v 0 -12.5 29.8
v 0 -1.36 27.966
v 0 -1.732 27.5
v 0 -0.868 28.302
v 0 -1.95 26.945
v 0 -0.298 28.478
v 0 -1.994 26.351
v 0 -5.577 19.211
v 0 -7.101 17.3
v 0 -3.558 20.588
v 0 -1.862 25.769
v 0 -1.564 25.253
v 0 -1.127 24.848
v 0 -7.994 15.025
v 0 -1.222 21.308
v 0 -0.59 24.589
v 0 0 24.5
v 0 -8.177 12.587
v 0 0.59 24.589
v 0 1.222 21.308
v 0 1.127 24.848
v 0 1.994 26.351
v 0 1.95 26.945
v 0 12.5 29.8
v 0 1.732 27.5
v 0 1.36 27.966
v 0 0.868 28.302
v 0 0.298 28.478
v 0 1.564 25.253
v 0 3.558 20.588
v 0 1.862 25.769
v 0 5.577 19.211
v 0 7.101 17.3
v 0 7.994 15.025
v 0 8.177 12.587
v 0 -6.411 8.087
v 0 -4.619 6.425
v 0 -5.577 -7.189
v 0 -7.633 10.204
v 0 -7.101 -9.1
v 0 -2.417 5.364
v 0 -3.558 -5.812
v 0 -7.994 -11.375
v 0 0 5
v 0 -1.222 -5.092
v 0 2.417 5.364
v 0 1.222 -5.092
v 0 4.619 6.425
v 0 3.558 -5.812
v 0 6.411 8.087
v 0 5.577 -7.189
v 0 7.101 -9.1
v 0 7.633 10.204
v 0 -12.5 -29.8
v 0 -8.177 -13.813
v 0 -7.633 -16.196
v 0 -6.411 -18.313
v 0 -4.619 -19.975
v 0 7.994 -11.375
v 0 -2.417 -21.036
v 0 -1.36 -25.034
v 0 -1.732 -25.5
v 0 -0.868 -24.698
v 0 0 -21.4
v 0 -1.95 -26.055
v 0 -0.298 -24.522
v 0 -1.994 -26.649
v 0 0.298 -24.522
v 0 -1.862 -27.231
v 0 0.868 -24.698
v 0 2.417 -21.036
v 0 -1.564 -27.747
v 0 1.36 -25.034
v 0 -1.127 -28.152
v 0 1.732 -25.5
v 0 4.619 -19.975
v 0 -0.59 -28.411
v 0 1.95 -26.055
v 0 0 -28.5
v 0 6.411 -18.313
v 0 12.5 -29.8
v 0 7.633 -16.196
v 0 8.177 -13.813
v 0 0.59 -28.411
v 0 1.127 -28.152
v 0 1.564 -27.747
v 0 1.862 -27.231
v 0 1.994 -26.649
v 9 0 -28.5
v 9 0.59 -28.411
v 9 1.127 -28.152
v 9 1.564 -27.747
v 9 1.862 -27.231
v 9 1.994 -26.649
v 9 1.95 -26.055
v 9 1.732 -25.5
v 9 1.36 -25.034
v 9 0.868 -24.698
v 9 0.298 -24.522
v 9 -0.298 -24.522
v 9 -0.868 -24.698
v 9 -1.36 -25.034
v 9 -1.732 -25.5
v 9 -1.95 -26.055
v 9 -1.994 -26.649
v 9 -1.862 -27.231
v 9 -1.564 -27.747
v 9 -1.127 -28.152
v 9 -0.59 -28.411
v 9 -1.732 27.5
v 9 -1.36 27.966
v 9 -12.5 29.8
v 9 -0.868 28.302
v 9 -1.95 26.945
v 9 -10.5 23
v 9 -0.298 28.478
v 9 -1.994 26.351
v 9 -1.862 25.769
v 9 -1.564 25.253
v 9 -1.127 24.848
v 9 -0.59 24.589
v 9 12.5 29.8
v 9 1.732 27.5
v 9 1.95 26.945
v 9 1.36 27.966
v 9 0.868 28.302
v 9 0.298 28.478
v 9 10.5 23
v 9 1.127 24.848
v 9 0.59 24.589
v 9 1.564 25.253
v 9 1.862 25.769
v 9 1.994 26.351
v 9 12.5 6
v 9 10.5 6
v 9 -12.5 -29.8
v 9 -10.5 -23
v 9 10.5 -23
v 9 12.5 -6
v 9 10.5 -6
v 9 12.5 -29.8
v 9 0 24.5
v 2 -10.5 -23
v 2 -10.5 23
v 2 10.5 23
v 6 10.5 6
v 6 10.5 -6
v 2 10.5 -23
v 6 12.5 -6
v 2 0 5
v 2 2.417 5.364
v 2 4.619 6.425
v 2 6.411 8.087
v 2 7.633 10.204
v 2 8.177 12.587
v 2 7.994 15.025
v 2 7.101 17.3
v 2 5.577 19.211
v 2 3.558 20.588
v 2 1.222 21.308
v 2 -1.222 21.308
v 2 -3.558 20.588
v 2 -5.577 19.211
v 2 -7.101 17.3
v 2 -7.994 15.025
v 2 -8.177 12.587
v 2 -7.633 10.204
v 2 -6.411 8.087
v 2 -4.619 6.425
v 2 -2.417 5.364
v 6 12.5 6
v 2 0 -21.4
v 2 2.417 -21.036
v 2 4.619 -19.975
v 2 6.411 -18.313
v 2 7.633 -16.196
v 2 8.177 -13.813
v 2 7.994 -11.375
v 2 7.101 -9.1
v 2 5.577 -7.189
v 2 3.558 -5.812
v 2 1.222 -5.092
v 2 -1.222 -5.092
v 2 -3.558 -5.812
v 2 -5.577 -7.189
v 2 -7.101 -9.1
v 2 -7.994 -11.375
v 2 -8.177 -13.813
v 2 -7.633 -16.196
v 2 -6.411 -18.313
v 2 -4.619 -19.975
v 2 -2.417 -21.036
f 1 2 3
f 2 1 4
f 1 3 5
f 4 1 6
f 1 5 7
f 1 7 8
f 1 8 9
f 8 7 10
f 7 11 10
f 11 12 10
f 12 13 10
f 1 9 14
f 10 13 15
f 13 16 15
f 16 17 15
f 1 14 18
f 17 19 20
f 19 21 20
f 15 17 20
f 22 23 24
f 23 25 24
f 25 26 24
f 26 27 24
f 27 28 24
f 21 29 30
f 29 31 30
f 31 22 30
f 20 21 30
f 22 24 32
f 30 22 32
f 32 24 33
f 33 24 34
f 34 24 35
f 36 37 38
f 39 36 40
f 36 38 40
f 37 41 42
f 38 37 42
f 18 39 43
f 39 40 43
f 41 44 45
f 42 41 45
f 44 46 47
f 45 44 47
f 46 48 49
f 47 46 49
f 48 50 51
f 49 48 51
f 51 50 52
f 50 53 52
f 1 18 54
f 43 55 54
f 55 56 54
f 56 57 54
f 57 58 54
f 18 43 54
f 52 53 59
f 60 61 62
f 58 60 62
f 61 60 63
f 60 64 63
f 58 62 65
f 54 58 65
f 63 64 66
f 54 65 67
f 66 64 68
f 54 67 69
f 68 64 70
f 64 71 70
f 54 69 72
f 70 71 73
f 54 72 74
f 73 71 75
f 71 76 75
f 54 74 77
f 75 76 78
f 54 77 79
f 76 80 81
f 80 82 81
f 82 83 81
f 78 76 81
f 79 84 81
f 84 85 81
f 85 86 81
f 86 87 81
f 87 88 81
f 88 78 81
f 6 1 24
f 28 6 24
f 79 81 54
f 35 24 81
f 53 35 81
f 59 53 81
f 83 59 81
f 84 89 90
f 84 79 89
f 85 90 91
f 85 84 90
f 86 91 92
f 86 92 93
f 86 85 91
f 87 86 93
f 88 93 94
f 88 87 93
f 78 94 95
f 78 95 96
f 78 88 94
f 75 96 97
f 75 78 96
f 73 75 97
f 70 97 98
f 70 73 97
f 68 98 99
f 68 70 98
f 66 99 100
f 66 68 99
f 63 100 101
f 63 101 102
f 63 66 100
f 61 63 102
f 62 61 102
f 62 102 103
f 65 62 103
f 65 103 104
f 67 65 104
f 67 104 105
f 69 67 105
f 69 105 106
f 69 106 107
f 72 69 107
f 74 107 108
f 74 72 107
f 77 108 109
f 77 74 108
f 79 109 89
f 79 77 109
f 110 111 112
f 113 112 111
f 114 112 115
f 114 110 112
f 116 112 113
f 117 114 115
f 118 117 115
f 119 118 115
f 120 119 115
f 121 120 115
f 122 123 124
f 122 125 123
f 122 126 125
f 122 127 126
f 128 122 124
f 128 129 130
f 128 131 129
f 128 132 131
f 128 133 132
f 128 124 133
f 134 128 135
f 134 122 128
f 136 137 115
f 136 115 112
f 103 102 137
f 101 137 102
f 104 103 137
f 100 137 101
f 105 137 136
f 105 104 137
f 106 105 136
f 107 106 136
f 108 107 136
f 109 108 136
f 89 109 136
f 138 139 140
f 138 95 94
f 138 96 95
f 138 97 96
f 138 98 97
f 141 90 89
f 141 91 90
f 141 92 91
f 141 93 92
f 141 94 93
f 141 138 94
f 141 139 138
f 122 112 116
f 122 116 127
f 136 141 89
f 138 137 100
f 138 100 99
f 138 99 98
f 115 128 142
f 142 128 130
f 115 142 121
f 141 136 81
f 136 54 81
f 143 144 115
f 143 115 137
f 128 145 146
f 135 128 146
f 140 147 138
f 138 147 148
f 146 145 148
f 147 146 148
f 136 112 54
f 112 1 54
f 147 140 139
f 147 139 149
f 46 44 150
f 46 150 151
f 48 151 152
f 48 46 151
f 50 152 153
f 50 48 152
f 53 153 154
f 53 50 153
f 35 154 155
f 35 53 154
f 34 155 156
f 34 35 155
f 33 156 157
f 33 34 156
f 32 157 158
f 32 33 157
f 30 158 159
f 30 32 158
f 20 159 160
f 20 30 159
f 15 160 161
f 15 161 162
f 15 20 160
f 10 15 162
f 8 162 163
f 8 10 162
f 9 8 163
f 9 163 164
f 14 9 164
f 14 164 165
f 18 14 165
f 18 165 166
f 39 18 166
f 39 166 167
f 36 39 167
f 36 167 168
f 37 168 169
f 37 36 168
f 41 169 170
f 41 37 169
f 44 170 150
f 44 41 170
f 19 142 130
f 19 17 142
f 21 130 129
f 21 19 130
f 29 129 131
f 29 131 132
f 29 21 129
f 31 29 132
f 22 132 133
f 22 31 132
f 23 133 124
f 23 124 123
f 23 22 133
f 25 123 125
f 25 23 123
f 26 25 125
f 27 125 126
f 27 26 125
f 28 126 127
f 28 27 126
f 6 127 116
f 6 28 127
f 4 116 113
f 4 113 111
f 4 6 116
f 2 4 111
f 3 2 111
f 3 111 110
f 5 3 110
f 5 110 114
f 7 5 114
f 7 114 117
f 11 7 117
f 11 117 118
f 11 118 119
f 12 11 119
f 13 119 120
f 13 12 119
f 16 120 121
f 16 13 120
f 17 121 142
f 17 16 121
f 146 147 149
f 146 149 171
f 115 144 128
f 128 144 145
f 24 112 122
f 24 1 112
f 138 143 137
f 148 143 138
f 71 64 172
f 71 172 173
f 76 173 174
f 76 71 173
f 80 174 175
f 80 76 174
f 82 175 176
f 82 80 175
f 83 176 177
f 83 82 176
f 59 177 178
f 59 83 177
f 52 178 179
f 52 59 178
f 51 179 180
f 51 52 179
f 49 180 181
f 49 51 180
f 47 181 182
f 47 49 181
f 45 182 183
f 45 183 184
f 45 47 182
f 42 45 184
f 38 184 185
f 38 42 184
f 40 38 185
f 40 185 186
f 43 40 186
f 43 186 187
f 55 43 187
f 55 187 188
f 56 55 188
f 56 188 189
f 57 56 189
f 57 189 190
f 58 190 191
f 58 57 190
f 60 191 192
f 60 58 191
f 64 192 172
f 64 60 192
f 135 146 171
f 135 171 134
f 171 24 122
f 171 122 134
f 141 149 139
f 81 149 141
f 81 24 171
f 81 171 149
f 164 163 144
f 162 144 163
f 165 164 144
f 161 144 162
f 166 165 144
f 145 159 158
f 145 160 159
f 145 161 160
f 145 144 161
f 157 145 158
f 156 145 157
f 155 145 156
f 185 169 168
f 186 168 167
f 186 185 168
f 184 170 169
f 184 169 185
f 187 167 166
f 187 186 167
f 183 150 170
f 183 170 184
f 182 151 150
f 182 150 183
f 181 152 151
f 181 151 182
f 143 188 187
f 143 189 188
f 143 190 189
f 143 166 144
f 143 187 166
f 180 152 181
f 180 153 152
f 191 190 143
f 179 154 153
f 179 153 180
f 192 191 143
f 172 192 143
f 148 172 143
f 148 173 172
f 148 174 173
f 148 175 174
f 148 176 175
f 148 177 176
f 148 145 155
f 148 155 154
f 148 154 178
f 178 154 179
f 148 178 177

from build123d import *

# Parameters (mm, degrees)
SKETCH1_R               = 2
SKETCH1_R_2             = 8.2
BOSS_EXTRUDE1_DEPTH     = 2
SKETCH3_W               = 59.6
SKETCH3_H               = 25
SKETCH3_R               = 2
SKETCH3_W_2             = 46
SKETCH3_H_2             = 21
BOSS_EXTRUDE3_DEPTH     = 7
CUT_EXTRUDE1_DEPTH      = 40.925430492
CUT_EXTRUDE1_DEPTH_BACK = 3


with BuildPart() as part:
    # Sketch1 → Boss-Extrude1 (new body)
    with BuildSketch(Plane(origin=(0, 0, 0), x_dir=(0, 0, -1), z_dir=(1, 0, 0))):
        Polygon((25, 12.5), (-25, 12.5), (-29.8, 12.5), (-29.8, -12.5), (-25, -12.5), (25, -12.5), (29.8, -12.5), (29.8, 12.5), align=None)
        with Locations((-26.5, 0)):
            Circle(SKETCH1_R, mode=Mode.SUBTRACT)
        with Locations((-13.2, 0)):
            Circle(SKETCH1_R_2, mode=Mode.SUBTRACT)
        with Locations((13.2, 0)):
            Circle(SKETCH1_R_2, mode=Mode.SUBTRACT)
        with Locations((26.5, 0)):
            Circle(SKETCH1_R, mode=Mode.SUBTRACT)
    extrude(amount=BOSS_EXTRUDE1_DEPTH)

    # Sketch3 → Boss-Extrude3 (add)
    with BuildSketch(Plane(origin=(2, 0, 0), x_dir=(0, 0, -1), z_dir=(1, 0, 0))):
        Rectangle(SKETCH3_W, SKETCH3_H)
        with Locations((-26.5, 0)):
            Circle(SKETCH3_R, mode=Mode.SUBTRACT)
        with Locations((26.5, 0)):
            Circle(SKETCH3_R, mode=Mode.SUBTRACT)
        Rectangle(SKETCH3_W_2, SKETCH3_H_2, mode=Mode.SUBTRACT)
    extrude(amount=BOSS_EXTRUDE3_DEPTH)

    # Sketch5 → Cut-Extrude1 (cut, two sides: drawn at the far end of the back side and taken through both)
    with BuildSketch(Plane(origin=(0, 12.5, 0), x_dir=(1, 0, 0), z_dir=(0, 1, 0)).offset(-CUT_EXTRUDE1_DEPTH_BACK)):
        Polygon((92.827908002, 6), (9, 6), (6, 6), (6, -6), (9, -6), (92.827908002, -6), (260.483724007, -6), (260.483724007, 6), align=None)
    extrude(amount=CUT_EXTRUDE1_DEPTH + CUT_EXTRUDE1_DEPTH_BACK, mode=Mode.SUBTRACT)


solid = part.part
